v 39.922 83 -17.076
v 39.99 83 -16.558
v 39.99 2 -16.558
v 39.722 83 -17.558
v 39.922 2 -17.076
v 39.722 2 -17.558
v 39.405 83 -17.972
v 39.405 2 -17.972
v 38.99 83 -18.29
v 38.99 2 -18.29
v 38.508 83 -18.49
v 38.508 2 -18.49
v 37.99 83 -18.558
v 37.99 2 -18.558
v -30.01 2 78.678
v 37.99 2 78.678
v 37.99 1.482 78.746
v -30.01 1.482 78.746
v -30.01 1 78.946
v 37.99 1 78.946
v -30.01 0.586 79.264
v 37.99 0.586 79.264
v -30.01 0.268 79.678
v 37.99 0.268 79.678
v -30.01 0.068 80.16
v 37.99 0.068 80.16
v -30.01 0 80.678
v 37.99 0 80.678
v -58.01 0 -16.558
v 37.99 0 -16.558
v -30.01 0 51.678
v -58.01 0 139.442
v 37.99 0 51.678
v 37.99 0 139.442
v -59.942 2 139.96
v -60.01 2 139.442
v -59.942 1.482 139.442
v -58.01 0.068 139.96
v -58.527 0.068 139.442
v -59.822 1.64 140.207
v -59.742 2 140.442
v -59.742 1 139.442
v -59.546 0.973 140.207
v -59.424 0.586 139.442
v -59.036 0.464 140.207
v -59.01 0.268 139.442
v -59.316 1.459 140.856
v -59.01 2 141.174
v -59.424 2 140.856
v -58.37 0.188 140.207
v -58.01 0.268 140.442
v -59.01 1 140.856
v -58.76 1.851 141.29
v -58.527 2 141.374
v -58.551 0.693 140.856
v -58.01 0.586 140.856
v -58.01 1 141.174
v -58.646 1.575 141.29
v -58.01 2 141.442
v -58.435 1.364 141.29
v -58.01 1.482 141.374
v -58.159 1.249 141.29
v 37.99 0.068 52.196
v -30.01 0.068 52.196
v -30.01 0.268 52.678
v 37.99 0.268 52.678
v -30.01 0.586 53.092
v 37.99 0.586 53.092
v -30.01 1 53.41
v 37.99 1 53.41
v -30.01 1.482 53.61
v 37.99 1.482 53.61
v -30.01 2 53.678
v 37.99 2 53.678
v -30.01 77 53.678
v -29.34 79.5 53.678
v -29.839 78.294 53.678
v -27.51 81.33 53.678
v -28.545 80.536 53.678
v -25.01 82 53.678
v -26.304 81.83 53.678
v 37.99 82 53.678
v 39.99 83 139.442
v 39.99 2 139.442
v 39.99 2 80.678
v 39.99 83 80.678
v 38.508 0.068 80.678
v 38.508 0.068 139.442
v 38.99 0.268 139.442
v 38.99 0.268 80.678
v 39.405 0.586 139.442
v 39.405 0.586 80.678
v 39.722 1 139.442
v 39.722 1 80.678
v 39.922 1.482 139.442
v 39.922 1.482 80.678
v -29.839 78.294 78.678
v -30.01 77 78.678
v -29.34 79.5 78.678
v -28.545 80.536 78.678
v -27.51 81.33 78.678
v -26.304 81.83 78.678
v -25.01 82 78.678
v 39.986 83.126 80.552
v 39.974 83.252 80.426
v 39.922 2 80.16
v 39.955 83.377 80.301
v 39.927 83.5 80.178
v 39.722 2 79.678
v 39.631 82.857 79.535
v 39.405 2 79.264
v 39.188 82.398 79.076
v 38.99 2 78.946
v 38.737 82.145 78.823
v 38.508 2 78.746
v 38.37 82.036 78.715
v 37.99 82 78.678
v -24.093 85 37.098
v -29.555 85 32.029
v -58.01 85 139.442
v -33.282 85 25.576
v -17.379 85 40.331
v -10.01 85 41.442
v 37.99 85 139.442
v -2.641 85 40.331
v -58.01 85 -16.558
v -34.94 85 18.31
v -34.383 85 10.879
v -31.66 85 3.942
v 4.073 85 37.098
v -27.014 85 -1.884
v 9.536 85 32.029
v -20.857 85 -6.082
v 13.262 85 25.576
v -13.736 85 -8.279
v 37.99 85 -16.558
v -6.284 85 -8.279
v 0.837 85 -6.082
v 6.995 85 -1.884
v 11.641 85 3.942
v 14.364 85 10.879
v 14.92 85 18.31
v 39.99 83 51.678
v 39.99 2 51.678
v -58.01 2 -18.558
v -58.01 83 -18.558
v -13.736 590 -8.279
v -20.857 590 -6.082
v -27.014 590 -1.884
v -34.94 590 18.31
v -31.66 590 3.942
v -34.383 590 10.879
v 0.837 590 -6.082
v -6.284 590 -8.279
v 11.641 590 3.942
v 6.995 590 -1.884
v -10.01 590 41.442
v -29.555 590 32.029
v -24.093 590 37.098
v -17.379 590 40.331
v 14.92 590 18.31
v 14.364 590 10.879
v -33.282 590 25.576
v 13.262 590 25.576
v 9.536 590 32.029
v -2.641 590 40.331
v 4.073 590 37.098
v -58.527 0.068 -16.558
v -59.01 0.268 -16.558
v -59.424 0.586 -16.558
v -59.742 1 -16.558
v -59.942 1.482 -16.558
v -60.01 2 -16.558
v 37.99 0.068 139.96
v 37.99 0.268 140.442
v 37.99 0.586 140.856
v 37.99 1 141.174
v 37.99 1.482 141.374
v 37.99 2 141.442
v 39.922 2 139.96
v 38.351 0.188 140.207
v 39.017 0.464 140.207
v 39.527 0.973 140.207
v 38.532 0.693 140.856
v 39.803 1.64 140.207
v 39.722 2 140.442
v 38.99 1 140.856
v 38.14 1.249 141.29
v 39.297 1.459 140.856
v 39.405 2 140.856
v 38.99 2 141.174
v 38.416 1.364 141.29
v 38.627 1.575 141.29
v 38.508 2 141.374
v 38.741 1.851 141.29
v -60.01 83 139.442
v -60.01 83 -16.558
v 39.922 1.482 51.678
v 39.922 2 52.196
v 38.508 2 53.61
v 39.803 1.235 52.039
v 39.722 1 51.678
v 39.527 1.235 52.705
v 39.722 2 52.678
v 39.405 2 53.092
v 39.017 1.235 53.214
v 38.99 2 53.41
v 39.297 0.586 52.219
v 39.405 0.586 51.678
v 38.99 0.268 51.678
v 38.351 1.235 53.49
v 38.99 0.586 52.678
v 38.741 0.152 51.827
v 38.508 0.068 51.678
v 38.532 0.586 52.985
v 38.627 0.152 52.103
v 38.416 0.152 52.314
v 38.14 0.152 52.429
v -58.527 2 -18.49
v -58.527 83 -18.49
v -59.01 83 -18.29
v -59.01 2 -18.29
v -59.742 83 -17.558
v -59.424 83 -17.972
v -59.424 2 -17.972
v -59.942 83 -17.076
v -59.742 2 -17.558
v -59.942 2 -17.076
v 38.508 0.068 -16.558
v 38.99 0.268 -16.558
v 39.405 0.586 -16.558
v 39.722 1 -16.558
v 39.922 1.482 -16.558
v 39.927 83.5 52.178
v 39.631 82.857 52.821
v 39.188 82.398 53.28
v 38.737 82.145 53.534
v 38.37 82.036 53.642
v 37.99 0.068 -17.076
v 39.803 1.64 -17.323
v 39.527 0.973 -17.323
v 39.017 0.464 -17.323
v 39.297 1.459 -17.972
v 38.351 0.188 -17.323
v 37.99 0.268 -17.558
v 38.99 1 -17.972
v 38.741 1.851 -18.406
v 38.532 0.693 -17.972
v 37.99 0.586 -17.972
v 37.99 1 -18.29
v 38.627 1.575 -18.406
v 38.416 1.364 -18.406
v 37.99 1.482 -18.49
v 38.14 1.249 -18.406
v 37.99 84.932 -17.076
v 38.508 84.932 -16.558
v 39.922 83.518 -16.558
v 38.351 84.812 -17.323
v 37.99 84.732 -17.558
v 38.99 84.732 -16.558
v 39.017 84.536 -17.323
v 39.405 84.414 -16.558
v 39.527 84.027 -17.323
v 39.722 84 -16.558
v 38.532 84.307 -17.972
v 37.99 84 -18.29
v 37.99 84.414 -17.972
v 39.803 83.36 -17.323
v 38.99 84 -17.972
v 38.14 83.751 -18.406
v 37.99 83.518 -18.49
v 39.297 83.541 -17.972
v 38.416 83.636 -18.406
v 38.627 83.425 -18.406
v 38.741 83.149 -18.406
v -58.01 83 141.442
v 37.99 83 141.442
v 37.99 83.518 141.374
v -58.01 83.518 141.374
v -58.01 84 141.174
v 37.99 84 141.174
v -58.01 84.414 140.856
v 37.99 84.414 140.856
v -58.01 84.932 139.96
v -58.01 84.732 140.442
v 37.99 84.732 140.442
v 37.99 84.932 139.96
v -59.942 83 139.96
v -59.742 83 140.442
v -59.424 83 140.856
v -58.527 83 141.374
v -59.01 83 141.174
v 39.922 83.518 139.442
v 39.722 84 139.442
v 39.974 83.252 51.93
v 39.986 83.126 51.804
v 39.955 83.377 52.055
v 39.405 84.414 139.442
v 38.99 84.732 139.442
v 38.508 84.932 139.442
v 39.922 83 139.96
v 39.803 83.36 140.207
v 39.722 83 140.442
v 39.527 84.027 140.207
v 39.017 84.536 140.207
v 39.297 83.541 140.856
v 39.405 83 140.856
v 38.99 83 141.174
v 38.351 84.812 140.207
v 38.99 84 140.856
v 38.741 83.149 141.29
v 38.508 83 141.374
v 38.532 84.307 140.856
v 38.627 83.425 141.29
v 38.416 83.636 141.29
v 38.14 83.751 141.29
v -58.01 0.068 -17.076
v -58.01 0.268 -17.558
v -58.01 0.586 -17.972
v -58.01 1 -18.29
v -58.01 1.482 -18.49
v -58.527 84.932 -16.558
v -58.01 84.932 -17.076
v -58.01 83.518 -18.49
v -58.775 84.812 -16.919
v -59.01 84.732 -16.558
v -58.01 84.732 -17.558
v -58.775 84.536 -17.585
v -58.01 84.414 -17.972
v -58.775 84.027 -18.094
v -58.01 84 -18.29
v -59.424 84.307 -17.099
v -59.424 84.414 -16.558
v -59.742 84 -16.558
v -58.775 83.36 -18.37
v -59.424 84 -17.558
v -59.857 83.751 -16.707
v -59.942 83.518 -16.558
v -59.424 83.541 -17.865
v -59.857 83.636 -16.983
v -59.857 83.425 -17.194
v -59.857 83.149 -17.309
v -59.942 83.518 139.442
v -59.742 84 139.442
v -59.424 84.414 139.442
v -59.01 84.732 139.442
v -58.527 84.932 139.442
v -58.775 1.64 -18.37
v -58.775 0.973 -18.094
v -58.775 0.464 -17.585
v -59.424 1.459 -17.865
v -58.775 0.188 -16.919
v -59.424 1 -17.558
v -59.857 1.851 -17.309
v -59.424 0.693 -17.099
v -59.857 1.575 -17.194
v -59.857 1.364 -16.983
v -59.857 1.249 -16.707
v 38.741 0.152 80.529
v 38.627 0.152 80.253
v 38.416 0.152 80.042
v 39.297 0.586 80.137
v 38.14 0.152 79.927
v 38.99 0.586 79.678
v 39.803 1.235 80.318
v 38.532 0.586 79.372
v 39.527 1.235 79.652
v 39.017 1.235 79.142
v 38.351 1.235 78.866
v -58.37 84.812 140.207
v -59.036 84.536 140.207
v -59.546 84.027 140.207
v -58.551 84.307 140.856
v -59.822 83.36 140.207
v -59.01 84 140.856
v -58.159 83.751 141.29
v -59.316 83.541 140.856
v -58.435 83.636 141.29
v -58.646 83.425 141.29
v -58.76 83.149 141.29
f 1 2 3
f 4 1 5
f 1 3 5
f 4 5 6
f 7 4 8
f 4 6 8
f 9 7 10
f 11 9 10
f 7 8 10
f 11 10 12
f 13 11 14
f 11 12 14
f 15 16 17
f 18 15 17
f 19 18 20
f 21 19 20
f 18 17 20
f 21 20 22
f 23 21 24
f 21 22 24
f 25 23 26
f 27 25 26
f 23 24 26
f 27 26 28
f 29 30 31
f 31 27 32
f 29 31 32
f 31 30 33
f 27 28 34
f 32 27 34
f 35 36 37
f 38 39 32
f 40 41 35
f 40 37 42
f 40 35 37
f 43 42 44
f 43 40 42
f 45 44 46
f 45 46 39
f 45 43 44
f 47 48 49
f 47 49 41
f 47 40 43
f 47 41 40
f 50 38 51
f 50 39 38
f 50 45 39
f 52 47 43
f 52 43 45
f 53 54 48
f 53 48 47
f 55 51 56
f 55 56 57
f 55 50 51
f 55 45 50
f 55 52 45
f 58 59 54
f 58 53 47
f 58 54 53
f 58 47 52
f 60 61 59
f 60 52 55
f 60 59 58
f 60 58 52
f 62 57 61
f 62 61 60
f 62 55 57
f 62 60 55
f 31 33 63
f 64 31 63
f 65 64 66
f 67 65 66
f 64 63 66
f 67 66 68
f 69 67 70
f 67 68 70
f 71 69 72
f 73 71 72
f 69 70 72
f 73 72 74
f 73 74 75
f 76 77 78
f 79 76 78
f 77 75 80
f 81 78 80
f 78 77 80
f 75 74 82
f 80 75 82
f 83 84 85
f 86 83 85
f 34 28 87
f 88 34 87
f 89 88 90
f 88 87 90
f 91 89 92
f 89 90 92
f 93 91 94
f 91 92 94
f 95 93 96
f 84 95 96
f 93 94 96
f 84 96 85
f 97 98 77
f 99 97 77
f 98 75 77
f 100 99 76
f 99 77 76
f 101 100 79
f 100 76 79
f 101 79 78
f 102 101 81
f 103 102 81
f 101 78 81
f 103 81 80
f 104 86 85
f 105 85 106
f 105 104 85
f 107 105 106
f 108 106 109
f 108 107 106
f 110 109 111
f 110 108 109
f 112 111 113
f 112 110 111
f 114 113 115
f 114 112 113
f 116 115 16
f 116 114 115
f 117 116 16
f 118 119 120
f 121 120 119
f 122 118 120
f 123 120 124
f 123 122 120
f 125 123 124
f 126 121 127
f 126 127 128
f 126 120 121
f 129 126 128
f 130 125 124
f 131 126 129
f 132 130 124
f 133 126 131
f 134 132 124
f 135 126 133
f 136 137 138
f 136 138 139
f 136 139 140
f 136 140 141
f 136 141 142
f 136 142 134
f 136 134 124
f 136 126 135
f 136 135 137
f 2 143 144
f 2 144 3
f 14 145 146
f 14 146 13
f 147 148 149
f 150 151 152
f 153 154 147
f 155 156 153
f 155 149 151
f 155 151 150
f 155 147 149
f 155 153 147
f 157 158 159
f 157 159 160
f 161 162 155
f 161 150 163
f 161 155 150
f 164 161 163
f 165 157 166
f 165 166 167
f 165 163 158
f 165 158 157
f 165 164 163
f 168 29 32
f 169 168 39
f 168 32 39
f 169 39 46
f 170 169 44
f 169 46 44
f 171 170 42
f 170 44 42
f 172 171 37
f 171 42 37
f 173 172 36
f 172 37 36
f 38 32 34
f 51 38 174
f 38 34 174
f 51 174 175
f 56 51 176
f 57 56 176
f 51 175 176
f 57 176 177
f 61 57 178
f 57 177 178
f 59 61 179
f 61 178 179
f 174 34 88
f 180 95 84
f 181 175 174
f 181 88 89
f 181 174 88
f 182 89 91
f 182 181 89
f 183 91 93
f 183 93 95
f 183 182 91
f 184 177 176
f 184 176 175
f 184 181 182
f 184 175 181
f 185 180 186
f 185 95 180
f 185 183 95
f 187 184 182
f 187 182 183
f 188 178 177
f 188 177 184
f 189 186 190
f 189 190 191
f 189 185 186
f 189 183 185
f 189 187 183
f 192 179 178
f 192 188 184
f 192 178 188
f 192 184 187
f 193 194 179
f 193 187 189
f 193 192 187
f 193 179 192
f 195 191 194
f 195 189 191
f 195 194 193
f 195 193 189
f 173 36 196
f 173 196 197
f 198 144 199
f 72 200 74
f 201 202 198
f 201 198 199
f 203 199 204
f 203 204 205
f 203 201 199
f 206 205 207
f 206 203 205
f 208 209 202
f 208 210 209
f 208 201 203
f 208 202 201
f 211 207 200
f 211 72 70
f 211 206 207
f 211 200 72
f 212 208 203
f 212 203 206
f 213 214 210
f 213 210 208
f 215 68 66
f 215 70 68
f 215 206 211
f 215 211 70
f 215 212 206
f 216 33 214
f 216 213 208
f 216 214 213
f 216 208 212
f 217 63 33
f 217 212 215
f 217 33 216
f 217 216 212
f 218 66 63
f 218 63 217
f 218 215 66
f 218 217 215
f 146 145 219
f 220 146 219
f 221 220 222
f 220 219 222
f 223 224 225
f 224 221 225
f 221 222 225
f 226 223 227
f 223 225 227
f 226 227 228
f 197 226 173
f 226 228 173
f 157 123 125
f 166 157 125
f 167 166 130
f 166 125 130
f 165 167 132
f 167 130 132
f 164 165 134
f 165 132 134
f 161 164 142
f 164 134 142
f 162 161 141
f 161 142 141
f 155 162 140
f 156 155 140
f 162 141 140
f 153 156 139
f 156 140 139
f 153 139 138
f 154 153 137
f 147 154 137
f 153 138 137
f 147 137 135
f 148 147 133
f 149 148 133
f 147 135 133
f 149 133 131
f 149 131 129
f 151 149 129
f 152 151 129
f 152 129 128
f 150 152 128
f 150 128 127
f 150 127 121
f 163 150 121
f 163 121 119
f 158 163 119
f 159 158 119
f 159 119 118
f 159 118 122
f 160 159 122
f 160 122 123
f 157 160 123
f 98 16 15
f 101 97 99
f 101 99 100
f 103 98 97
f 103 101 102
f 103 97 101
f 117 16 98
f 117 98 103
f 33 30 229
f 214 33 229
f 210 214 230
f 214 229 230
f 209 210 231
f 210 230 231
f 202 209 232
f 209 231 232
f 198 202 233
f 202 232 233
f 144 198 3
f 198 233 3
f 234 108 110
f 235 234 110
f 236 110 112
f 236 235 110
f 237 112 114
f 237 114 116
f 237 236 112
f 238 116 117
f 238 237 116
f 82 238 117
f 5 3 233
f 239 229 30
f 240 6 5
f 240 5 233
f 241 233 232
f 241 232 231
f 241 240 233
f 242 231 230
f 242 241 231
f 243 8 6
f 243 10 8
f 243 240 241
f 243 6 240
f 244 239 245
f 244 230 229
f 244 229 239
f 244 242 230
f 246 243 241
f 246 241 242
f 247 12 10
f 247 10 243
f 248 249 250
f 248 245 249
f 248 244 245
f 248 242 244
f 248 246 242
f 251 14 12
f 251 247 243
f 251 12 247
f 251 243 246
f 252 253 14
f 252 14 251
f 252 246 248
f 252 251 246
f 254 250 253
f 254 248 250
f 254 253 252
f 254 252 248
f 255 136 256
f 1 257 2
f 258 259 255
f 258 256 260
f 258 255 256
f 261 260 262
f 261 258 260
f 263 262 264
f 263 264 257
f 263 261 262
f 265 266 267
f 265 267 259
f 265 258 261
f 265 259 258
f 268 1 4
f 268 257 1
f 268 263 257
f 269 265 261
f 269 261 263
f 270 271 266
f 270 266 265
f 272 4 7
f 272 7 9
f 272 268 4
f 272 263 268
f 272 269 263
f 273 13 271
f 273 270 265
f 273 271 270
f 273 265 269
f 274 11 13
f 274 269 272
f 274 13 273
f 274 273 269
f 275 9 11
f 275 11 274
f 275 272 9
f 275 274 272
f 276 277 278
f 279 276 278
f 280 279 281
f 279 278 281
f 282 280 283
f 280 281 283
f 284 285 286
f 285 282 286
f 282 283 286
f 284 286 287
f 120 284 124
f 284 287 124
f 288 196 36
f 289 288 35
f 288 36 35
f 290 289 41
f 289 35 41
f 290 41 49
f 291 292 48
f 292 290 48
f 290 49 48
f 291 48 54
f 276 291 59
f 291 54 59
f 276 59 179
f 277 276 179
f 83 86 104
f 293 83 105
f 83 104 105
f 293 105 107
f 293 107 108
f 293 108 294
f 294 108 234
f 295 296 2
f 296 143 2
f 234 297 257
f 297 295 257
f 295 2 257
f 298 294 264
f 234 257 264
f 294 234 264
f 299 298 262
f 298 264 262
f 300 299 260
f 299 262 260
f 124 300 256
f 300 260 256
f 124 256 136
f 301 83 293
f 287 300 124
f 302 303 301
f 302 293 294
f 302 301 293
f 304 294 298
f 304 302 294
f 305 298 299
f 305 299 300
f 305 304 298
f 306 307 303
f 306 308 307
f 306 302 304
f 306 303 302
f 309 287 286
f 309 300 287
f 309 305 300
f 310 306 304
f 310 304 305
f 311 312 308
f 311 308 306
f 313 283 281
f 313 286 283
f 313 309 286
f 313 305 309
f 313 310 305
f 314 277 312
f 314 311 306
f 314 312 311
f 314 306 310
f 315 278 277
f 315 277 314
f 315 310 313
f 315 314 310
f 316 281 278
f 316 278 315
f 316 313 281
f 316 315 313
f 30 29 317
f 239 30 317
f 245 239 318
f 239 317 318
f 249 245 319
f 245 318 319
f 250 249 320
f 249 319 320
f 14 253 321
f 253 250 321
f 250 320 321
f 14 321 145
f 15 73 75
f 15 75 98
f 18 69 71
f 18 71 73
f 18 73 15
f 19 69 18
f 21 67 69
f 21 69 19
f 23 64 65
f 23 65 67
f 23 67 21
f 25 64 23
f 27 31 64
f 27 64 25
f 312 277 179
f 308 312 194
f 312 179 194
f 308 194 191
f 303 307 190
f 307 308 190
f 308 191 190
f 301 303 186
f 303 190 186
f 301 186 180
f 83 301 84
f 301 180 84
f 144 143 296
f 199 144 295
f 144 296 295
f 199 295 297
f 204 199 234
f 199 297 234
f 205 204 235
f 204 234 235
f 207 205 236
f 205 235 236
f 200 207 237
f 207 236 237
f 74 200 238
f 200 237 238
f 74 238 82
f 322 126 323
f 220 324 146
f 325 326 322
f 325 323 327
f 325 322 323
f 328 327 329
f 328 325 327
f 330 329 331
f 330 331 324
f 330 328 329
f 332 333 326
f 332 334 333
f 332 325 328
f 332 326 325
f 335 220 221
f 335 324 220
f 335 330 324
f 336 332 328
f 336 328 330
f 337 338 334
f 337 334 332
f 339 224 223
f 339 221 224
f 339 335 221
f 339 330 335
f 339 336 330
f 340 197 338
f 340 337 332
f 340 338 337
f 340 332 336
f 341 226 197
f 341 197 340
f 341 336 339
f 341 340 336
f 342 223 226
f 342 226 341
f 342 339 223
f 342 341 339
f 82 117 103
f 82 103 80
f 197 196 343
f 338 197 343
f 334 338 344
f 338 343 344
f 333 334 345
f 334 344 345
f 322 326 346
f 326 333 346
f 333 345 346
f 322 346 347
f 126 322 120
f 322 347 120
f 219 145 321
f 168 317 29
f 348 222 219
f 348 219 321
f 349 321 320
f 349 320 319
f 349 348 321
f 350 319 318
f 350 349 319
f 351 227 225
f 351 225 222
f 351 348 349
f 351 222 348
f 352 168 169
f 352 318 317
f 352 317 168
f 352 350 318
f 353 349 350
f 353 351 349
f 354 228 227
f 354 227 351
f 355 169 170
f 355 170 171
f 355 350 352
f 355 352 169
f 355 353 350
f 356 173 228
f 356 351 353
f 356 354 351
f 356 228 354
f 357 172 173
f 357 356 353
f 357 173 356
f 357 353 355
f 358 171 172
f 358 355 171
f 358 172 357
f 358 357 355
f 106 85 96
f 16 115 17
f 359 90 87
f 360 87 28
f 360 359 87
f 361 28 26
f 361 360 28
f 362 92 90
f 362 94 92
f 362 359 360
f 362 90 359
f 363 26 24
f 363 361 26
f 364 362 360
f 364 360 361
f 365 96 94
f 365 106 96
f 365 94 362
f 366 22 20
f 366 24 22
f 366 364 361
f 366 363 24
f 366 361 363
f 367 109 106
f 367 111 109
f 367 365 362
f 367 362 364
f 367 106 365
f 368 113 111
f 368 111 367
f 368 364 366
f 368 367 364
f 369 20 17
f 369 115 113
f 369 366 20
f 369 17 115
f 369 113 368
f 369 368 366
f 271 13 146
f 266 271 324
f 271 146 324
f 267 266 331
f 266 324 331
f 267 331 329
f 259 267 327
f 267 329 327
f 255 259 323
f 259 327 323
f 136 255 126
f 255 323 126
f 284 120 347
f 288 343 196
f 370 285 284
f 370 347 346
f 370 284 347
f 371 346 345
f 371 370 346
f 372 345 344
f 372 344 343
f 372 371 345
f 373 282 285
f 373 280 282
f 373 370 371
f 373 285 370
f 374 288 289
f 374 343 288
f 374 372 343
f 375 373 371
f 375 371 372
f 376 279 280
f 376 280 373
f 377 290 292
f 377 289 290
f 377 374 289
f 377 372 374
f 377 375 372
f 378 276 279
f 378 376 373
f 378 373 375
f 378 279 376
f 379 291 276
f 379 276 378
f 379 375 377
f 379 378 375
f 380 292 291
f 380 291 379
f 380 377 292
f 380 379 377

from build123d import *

# Parameters (mm, degrees)
SKETCH1_W           = 100
SKETCH1_H           = 160
BOSS_EXTRUDE1_DEPTH = 85
SKETCH2_R           = 25
BOSS_EXTRUDE2_DEPTH = 590
SKETCH3_W           = 25
SKETCH3_H           = 82
CUT_EXTRUDE1_DEPTH  = 70
FILLET2_R           = 2
FILLET3_R           = 5
FILLET4_R           = 2


with BuildPart() as part:
    # Sketch1 → Boss-Extrude1 (new body)
    with BuildSketch(Plane(origin=(0, 0, 0), x_dir=(1, 0, 0), z_dir=(0, 1, 0))):
        with Locations((-10.009659714, -61.441979522)):
            Rectangle(SKETCH1_W, SKETCH1_H)
    extrude(amount=BOSS_EXTRUDE1_DEPTH)

    # Sketch2 → Boss-Extrude2 (add)
    with BuildSketch(Plane(origin=(0, 0, 0), x_dir=(1, 0, 0), z_dir=(0, 1, 0))):
        with Locations(Location((-10.009659714, -16.441979522, 0), (0, 0, 270))):
            Circle(SKETCH2_R)
    extrude(amount=BOSS_EXTRUDE2_DEPTH)

    # Sketch3 → Cut-Extrude1 (cut)
    with BuildSketch(Plane(origin=(39.990340286, 0, 0), x_dir=(0, 0, -1), z_dir=(1, 0, 0))):
        with Locations((-66.178079743, 41)):
            Rectangle(SKETCH3_W, SKETCH3_H)
    extrude(amount=-CUT_EXTRUDE1_DEPTH, mode=Mode.SUBTRACT)

    # Fillet2
    fillet2_edges = [part.edges().sort_by_distance(p)[0] for p in [
        (39.990340286, 41, 53.678079743),
        (39.990340286, 82, 66.178079743),
        (39.990340286, 41, 78.678079743),
    ]]
    fillet(fillet2_edges, radius=FILLET2_R)

    # Fillet3
    fillet3_edges = [part.edges().sort_by_distance(p)[0] for p in [
        (-30.009659714, 82, 66.178079743),
    ]]
    fillet(fillet3_edges, radius=FILLET3_R)

    # Fillet4
    # the kernel refuses this fillet: 2 mm, written as the material it takes off along each edge
    with BuildSketch(Plane(origin=(-58.009659714, 83, -16.558020478), x_dir=(0, 0, -1), z_dir=(-1, 0, 0))) as fillet4_piece_1_section:
        Polygon((0, 0), (FILLET4_R, 0), (FILLET4_R, -FILLET4_R), (0, -FILLET4_R), align=None)
    fillet4_piece_1 = extrude(amount=FILLET4_R, mode=Mode.PRIVATE)
    fillet4_piece_1 = fillet4_piece_1 - Plane(origin=(-58.009659714, 83, -16.558020478), x_dir=(0, -0.7071067811865475, 0.7071067811865475), z_dir=(-1, 0, 0)) * Sphere(FILLET4_R, mode=Mode.PRIVATE)
    add(fillet4_piece_1, mode=Mode.SUBTRACT)
    with BuildSketch(Plane(origin=(37.990340286, 83, -16.558020478), x_dir=(0, 1, 0), z_dir=(0, 0, -1))) as fillet4_piece_2_section:
        Polygon((0, 0), (FILLET4_R, 0), (FILLET4_R, FILLET4_R), (0, FILLET4_R), align=None)
    fillet4_piece_2 = extrude(amount=FILLET4_R, mode=Mode.PRIVATE)
    fillet4_piece_2 = fillet4_piece_2 - Plane(origin=(37.990340286, 83, -16.558020478), x_dir=(-0.7071067811865475, -0.7071067811865475, 0), z_dir=(0, 0, -1)) * Sphere(FILLET4_R, mode=Mode.PRIVATE)
    add(fillet4_piece_2, mode=Mode.SUBTRACT)
    with BuildSketch(Plane(origin=(-58.009659714, 2, -16.558020478), x_dir=(0, 0, -1), z_dir=(-1, 0, 0))) as fillet4_piece_3_section:
        Polygon((0, 0), (FILLET4_R, 0), (FILLET4_R, FILLET4_R), (0, FILLET4_R), align=None)
    fillet4_piece_3 = extrude(amount=FILLET4_R, mode=Mode.PRIVATE)
    fillet4_piece_3 = fillet4_piece_3 - Plane(origin=(-58.009659714, 2, -16.558020478), x_dir=(0, 0.7071067811865475, 0.7071067811865475), z_dir=(-1, 0, 0)) * Sphere(FILLET4_R, mode=Mode.PRIVATE)
    add(fillet4_piece_3, mode=Mode.SUBTRACT)
    with BuildSketch(Plane(origin=(37.990340286, 2, -16.558020478), x_dir=(0, -1, 0), z_dir=(0, 0, -1))) as fillet4_piece_4_section:
        Polygon((0, 0), (FILLET4_R, 0), (FILLET4_R, -FILLET4_R), (0, -FILLET4_R), align=None)
    fillet4_piece_4 = extrude(amount=FILLET4_R, mode=Mode.PRIVATE)
    fillet4_piece_4 = fillet4_piece_4 - Plane(origin=(37.990340286, 2, -16.558020478), x_dir=(-0.7071067811865475, 0.7071067811865475, 0), z_dir=(0, 0, -1)) * Sphere(FILLET4_R, mode=Mode.PRIVATE)
    add(fillet4_piece_4, mode=Mode.SUBTRACT)
    with BuildSketch(Plane(origin=(37.990340286, 2, 139.441979522), x_dir=(0, -1, 0), z_dir=(0, 0, 1))) as fillet4_piece_5_section:
        Polygon((0, 0), (FILLET4_R, 0), (FILLET4_R, FILLET4_R), (0, FILLET4_R), align=None)
    fillet4_piece_5 = extrude(amount=FILLET4_R, mode=Mode.PRIVATE)
    fillet4_piece_5 = fillet4_piece_5 - Plane(origin=(37.990340286, 2, 139.441979522), x_dir=(-0.7071067811865475, 0.7071067811865475, 0), z_dir=(0, 0, 1)) * Sphere(FILLET4_R, mode=Mode.PRIVATE)
    add(fillet4_piece_5, mode=Mode.SUBTRACT)
    with BuildSketch(Plane(origin=(37.990340286, 83, 139.441979522), x_dir=(0, 1, 0), z_dir=(0, 0, 1))) as fillet4_piece_6_section:
        Polygon((0, 0), (FILLET4_R, 0), (FILLET4_R, -FILLET4_R), (0, -FILLET4_R), align=None)
    fillet4_piece_6 = extrude(amount=FILLET4_R, mode=Mode.PRIVATE)
    fillet4_piece_6 = fillet4_piece_6 - Plane(origin=(37.990340286, 83, 139.441979522), x_dir=(-0.7071067811865475, -0.7071067811865475, 0), z_dir=(0, 0, 1)) * Sphere(FILLET4_R, mode=Mode.PRIVATE)
    add(fillet4_piece_6, mode=Mode.SUBTRACT)
    with BuildSketch(Plane(origin=(-58.009659714, 83, 139.441979522), x_dir=(-1, 0, 0), z_dir=(0, 0, 1))) as fillet4_piece_7_section:
        Polygon((0, 0), (FILLET4_R, 0), (FILLET4_R, -FILLET4_R), (0, -FILLET4_R), align=None)
    fillet4_piece_7 = extrude(amount=FILLET4_R, mode=Mode.PRIVATE)
    fillet4_piece_7 = fillet4_piece_7 - Plane(origin=(-58.009659714, 83, 139.441979522), x_dir=(0.7071067811865475, -0.7071067811865475, 0), z_dir=(0, 0, 1)) * Sphere(FILLET4_R, mode=Mode.PRIVATE)
    add(fillet4_piece_7, mode=Mode.SUBTRACT)
    with BuildSketch(Plane(origin=(-58.009659714, 2, 139.441979522), x_dir=(-1, 0, 0), z_dir=(0, 0, 1))) as fillet4_piece_8_section:
        Polygon((0, 0), (FILLET4_R, 0), (FILLET4_R, FILLET4_R), (0, FILLET4_R), align=None)
    fillet4_piece_8 = extrude(amount=FILLET4_R, mode=Mode.PRIVATE)
    fillet4_piece_8 = fillet4_piece_8 - Plane(origin=(-58.009659714, 2, 139.441979522), x_dir=(0.7071067811865475, 0.7071067811865475, 0), z_dir=(0, 0, 1)) * Sphere(FILLET4_R, mode=Mode.PRIVATE)
    add(fillet4_piece_8, mode=Mode.SUBTRACT)
    with BuildSketch(Plane(origin=(37.990340286, 0, 53.678079743), x_dir=(0, 0, -1), z_dir=(-1, 0, 0)), Plane(origin=(37.990340286, 0, 78.678079743), x_dir=(0, 1, 0), z_dir=(-1, 0, 0))) as fillet4_piece_9:
        with BuildLine():
            CenterArc((FILLET4_R, -FILLET4_R), FILLET4_R, 90, 90)
            Line((0, -FILLET4_R), (0, 0))
            Line((0, 0), (FILLET4_R, 0))
        make_face()
    extrude(amount=68, mode=Mode.SUBTRACT)
    with BuildSketch(Plane(origin=(37.990340286, 0, 51.678079743), x_dir=(1, 0, 0), z_dir=(0, 0, -1))) as fillet4_piece_10:
        with BuildLine():
            CenterArc((2 - FILLET4_R, -FILLET4_R), FILLET4_R, 0, 90)
            Line((2, -FILLET4_R), (2, 0))
            Line((2, 0), (2 - FILLET4_R, 0))
        make_face()
    revolve(axis=Axis((37.990340286, 0, 51.678079743), (0, -1, 0)), revolution_arc=90, mode=Mode.SUBTRACT)
    with BuildSketch(Plane(origin=(37.990340286, 0, 80.678079743), x_dir=(1, 0, 0), z_dir=(0, 0, 1))) as fillet4_piece_11:
        with BuildLine():
            CenterArc((2 - FILLET4_R, FILLET4_R), FILLET4_R, 270, 90)
            Line((2, FILLET4_R), (2, 0))
            Line((2, 0), (2 - FILLET4_R, 0))
        make_face()
    revolve(axis=Axis((37.990340286, 0, 80.678079743), (0, 1, 0)), revolution_arc=90, mode=Mode.SUBTRACT)
    with BuildSketch(Plane(origin=(-58.009659714, 85, -18.558020478), x_dir=(0, -1, 0), z_dir=(1, 0, 0)), Plane(origin=(-58.009659714, 0, -18.558020478), x_dir=(0, 0, 1), z_dir=(1, 0, 0)), Plane(origin=(37.990340286, 85, 141.441979522), x_dir=(0, -1, 0), z_dir=(-1, 0, 0)), Plane(origin=(37.990340286, 0, 141.441979522), x_dir=(0, 0, -1), z_dir=(-1, 0, 0))) as fillet4_piece_12:
        with BuildLine():
            CenterArc((FILLET4_R, -FILLET4_R), FILLET4_R, 90, 90)
            Line((0, -FILLET4_R), (0, 0))
            Line((0, 0), (FILLET4_R, 0))
        make_face()
    extrude(amount=96, mode=Mode.SUBTRACT)
    with BuildSketch(Plane(origin=(-60.009659714, 2, -18.558020478), x_dir=(0, 0, 1), z_dir=(0, 1, 0)), Plane(origin=(39.990340286, 2, 141.441979522), x_dir=(0, 0, -1), z_dir=(0, 1, 0)), Plane(origin=(-60.009659714, 2, 141.441979522), x_dir=(1, 0, 0), z_dir=(0, 1, 0))) as fillet4_piece_13:
        with BuildLine():
            CenterArc((FILLET4_R, FILLET4_R), FILLET4_R, 180, 90)
            Line((0, FILLET4_R), (0, 0))
            Line((0, 0), (FILLET4_R, 0))
        make_face()
    extrude(amount=81, mode=Mode.SUBTRACT)
    with BuildSketch(Plane(origin=(39.990340286, 0, -16.558020478), x_dir=(-1, 0, 0), z_dir=(0, 0, 1))) as fillet4_piece_14:
        with BuildLine():
            CenterArc((FILLET4_R, -FILLET4_R), FILLET4_R, 90, 90)
            Line((0, -FILLET4_R), (0, 0))
            Line((0, 0), (FILLET4_R, 0))
        make_face()
    extrude(amount=68.236100221, mode=Mode.SUBTRACT)
    with BuildSketch(Plane(origin=(39.990340286, 0, 80.678079743), x_dir=(-1, 0, 0), z_dir=(0, 0, 1))) as fillet4_piece_15:
        with BuildLine():
            CenterArc((FILLET4_R, -FILLET4_R), FILLET4_R, 90, 90)
            Line((0, -FILLET4_R), (0, 0))
            Line((0, 0), (FILLET4_R, 0))
        make_face()
    extrude(amount=58.763899779, mode=Mode.SUBTRACT)
    with BuildSketch(Plane(origin=(39.990340286, 2, -18.558020478), x_dir=(0, 0, 1), z_dir=(0, 1, 0))) as fillet4_piece_16:
        with BuildLine():
            CenterArc((FILLET4_R, -FILLET4_R), FILLET4_R, 90, 90)
            Line((0, -FILLET4_R), (0, 0))
            Line((0, 0), (FILLET4_R, 0))
        make_face()
    extrude(amount=81, mode=Mode.SUBTRACT)
    with BuildSketch(Plane(origin=(39.990340286, 85, -16.558020478), x_dir=(0, -1, 0), z_dir=(0, 0, 1)), Plane(origin=(-60.009659714, 0, 139.441979522), x_dir=(1, 0, 0), z_dir=(0, 0, -1)), Plane(origin=(-60.009659714, 85, 139.441979522), x_dir=(0, -1, 0), z_dir=(0, 0, -1))) as fillet4_piece_17:
        with BuildLine():
            CenterArc((FILLET4_R, -FILLET4_R), FILLET4_R, 90, 90)
            Line((0, -FILLET4_R), (0, 0))
            Line((0, 0), (FILLET4_R, 0))
        make_face()
    extrude(amount=156, mode=Mode.SUBTRACT)


solid = part.part
